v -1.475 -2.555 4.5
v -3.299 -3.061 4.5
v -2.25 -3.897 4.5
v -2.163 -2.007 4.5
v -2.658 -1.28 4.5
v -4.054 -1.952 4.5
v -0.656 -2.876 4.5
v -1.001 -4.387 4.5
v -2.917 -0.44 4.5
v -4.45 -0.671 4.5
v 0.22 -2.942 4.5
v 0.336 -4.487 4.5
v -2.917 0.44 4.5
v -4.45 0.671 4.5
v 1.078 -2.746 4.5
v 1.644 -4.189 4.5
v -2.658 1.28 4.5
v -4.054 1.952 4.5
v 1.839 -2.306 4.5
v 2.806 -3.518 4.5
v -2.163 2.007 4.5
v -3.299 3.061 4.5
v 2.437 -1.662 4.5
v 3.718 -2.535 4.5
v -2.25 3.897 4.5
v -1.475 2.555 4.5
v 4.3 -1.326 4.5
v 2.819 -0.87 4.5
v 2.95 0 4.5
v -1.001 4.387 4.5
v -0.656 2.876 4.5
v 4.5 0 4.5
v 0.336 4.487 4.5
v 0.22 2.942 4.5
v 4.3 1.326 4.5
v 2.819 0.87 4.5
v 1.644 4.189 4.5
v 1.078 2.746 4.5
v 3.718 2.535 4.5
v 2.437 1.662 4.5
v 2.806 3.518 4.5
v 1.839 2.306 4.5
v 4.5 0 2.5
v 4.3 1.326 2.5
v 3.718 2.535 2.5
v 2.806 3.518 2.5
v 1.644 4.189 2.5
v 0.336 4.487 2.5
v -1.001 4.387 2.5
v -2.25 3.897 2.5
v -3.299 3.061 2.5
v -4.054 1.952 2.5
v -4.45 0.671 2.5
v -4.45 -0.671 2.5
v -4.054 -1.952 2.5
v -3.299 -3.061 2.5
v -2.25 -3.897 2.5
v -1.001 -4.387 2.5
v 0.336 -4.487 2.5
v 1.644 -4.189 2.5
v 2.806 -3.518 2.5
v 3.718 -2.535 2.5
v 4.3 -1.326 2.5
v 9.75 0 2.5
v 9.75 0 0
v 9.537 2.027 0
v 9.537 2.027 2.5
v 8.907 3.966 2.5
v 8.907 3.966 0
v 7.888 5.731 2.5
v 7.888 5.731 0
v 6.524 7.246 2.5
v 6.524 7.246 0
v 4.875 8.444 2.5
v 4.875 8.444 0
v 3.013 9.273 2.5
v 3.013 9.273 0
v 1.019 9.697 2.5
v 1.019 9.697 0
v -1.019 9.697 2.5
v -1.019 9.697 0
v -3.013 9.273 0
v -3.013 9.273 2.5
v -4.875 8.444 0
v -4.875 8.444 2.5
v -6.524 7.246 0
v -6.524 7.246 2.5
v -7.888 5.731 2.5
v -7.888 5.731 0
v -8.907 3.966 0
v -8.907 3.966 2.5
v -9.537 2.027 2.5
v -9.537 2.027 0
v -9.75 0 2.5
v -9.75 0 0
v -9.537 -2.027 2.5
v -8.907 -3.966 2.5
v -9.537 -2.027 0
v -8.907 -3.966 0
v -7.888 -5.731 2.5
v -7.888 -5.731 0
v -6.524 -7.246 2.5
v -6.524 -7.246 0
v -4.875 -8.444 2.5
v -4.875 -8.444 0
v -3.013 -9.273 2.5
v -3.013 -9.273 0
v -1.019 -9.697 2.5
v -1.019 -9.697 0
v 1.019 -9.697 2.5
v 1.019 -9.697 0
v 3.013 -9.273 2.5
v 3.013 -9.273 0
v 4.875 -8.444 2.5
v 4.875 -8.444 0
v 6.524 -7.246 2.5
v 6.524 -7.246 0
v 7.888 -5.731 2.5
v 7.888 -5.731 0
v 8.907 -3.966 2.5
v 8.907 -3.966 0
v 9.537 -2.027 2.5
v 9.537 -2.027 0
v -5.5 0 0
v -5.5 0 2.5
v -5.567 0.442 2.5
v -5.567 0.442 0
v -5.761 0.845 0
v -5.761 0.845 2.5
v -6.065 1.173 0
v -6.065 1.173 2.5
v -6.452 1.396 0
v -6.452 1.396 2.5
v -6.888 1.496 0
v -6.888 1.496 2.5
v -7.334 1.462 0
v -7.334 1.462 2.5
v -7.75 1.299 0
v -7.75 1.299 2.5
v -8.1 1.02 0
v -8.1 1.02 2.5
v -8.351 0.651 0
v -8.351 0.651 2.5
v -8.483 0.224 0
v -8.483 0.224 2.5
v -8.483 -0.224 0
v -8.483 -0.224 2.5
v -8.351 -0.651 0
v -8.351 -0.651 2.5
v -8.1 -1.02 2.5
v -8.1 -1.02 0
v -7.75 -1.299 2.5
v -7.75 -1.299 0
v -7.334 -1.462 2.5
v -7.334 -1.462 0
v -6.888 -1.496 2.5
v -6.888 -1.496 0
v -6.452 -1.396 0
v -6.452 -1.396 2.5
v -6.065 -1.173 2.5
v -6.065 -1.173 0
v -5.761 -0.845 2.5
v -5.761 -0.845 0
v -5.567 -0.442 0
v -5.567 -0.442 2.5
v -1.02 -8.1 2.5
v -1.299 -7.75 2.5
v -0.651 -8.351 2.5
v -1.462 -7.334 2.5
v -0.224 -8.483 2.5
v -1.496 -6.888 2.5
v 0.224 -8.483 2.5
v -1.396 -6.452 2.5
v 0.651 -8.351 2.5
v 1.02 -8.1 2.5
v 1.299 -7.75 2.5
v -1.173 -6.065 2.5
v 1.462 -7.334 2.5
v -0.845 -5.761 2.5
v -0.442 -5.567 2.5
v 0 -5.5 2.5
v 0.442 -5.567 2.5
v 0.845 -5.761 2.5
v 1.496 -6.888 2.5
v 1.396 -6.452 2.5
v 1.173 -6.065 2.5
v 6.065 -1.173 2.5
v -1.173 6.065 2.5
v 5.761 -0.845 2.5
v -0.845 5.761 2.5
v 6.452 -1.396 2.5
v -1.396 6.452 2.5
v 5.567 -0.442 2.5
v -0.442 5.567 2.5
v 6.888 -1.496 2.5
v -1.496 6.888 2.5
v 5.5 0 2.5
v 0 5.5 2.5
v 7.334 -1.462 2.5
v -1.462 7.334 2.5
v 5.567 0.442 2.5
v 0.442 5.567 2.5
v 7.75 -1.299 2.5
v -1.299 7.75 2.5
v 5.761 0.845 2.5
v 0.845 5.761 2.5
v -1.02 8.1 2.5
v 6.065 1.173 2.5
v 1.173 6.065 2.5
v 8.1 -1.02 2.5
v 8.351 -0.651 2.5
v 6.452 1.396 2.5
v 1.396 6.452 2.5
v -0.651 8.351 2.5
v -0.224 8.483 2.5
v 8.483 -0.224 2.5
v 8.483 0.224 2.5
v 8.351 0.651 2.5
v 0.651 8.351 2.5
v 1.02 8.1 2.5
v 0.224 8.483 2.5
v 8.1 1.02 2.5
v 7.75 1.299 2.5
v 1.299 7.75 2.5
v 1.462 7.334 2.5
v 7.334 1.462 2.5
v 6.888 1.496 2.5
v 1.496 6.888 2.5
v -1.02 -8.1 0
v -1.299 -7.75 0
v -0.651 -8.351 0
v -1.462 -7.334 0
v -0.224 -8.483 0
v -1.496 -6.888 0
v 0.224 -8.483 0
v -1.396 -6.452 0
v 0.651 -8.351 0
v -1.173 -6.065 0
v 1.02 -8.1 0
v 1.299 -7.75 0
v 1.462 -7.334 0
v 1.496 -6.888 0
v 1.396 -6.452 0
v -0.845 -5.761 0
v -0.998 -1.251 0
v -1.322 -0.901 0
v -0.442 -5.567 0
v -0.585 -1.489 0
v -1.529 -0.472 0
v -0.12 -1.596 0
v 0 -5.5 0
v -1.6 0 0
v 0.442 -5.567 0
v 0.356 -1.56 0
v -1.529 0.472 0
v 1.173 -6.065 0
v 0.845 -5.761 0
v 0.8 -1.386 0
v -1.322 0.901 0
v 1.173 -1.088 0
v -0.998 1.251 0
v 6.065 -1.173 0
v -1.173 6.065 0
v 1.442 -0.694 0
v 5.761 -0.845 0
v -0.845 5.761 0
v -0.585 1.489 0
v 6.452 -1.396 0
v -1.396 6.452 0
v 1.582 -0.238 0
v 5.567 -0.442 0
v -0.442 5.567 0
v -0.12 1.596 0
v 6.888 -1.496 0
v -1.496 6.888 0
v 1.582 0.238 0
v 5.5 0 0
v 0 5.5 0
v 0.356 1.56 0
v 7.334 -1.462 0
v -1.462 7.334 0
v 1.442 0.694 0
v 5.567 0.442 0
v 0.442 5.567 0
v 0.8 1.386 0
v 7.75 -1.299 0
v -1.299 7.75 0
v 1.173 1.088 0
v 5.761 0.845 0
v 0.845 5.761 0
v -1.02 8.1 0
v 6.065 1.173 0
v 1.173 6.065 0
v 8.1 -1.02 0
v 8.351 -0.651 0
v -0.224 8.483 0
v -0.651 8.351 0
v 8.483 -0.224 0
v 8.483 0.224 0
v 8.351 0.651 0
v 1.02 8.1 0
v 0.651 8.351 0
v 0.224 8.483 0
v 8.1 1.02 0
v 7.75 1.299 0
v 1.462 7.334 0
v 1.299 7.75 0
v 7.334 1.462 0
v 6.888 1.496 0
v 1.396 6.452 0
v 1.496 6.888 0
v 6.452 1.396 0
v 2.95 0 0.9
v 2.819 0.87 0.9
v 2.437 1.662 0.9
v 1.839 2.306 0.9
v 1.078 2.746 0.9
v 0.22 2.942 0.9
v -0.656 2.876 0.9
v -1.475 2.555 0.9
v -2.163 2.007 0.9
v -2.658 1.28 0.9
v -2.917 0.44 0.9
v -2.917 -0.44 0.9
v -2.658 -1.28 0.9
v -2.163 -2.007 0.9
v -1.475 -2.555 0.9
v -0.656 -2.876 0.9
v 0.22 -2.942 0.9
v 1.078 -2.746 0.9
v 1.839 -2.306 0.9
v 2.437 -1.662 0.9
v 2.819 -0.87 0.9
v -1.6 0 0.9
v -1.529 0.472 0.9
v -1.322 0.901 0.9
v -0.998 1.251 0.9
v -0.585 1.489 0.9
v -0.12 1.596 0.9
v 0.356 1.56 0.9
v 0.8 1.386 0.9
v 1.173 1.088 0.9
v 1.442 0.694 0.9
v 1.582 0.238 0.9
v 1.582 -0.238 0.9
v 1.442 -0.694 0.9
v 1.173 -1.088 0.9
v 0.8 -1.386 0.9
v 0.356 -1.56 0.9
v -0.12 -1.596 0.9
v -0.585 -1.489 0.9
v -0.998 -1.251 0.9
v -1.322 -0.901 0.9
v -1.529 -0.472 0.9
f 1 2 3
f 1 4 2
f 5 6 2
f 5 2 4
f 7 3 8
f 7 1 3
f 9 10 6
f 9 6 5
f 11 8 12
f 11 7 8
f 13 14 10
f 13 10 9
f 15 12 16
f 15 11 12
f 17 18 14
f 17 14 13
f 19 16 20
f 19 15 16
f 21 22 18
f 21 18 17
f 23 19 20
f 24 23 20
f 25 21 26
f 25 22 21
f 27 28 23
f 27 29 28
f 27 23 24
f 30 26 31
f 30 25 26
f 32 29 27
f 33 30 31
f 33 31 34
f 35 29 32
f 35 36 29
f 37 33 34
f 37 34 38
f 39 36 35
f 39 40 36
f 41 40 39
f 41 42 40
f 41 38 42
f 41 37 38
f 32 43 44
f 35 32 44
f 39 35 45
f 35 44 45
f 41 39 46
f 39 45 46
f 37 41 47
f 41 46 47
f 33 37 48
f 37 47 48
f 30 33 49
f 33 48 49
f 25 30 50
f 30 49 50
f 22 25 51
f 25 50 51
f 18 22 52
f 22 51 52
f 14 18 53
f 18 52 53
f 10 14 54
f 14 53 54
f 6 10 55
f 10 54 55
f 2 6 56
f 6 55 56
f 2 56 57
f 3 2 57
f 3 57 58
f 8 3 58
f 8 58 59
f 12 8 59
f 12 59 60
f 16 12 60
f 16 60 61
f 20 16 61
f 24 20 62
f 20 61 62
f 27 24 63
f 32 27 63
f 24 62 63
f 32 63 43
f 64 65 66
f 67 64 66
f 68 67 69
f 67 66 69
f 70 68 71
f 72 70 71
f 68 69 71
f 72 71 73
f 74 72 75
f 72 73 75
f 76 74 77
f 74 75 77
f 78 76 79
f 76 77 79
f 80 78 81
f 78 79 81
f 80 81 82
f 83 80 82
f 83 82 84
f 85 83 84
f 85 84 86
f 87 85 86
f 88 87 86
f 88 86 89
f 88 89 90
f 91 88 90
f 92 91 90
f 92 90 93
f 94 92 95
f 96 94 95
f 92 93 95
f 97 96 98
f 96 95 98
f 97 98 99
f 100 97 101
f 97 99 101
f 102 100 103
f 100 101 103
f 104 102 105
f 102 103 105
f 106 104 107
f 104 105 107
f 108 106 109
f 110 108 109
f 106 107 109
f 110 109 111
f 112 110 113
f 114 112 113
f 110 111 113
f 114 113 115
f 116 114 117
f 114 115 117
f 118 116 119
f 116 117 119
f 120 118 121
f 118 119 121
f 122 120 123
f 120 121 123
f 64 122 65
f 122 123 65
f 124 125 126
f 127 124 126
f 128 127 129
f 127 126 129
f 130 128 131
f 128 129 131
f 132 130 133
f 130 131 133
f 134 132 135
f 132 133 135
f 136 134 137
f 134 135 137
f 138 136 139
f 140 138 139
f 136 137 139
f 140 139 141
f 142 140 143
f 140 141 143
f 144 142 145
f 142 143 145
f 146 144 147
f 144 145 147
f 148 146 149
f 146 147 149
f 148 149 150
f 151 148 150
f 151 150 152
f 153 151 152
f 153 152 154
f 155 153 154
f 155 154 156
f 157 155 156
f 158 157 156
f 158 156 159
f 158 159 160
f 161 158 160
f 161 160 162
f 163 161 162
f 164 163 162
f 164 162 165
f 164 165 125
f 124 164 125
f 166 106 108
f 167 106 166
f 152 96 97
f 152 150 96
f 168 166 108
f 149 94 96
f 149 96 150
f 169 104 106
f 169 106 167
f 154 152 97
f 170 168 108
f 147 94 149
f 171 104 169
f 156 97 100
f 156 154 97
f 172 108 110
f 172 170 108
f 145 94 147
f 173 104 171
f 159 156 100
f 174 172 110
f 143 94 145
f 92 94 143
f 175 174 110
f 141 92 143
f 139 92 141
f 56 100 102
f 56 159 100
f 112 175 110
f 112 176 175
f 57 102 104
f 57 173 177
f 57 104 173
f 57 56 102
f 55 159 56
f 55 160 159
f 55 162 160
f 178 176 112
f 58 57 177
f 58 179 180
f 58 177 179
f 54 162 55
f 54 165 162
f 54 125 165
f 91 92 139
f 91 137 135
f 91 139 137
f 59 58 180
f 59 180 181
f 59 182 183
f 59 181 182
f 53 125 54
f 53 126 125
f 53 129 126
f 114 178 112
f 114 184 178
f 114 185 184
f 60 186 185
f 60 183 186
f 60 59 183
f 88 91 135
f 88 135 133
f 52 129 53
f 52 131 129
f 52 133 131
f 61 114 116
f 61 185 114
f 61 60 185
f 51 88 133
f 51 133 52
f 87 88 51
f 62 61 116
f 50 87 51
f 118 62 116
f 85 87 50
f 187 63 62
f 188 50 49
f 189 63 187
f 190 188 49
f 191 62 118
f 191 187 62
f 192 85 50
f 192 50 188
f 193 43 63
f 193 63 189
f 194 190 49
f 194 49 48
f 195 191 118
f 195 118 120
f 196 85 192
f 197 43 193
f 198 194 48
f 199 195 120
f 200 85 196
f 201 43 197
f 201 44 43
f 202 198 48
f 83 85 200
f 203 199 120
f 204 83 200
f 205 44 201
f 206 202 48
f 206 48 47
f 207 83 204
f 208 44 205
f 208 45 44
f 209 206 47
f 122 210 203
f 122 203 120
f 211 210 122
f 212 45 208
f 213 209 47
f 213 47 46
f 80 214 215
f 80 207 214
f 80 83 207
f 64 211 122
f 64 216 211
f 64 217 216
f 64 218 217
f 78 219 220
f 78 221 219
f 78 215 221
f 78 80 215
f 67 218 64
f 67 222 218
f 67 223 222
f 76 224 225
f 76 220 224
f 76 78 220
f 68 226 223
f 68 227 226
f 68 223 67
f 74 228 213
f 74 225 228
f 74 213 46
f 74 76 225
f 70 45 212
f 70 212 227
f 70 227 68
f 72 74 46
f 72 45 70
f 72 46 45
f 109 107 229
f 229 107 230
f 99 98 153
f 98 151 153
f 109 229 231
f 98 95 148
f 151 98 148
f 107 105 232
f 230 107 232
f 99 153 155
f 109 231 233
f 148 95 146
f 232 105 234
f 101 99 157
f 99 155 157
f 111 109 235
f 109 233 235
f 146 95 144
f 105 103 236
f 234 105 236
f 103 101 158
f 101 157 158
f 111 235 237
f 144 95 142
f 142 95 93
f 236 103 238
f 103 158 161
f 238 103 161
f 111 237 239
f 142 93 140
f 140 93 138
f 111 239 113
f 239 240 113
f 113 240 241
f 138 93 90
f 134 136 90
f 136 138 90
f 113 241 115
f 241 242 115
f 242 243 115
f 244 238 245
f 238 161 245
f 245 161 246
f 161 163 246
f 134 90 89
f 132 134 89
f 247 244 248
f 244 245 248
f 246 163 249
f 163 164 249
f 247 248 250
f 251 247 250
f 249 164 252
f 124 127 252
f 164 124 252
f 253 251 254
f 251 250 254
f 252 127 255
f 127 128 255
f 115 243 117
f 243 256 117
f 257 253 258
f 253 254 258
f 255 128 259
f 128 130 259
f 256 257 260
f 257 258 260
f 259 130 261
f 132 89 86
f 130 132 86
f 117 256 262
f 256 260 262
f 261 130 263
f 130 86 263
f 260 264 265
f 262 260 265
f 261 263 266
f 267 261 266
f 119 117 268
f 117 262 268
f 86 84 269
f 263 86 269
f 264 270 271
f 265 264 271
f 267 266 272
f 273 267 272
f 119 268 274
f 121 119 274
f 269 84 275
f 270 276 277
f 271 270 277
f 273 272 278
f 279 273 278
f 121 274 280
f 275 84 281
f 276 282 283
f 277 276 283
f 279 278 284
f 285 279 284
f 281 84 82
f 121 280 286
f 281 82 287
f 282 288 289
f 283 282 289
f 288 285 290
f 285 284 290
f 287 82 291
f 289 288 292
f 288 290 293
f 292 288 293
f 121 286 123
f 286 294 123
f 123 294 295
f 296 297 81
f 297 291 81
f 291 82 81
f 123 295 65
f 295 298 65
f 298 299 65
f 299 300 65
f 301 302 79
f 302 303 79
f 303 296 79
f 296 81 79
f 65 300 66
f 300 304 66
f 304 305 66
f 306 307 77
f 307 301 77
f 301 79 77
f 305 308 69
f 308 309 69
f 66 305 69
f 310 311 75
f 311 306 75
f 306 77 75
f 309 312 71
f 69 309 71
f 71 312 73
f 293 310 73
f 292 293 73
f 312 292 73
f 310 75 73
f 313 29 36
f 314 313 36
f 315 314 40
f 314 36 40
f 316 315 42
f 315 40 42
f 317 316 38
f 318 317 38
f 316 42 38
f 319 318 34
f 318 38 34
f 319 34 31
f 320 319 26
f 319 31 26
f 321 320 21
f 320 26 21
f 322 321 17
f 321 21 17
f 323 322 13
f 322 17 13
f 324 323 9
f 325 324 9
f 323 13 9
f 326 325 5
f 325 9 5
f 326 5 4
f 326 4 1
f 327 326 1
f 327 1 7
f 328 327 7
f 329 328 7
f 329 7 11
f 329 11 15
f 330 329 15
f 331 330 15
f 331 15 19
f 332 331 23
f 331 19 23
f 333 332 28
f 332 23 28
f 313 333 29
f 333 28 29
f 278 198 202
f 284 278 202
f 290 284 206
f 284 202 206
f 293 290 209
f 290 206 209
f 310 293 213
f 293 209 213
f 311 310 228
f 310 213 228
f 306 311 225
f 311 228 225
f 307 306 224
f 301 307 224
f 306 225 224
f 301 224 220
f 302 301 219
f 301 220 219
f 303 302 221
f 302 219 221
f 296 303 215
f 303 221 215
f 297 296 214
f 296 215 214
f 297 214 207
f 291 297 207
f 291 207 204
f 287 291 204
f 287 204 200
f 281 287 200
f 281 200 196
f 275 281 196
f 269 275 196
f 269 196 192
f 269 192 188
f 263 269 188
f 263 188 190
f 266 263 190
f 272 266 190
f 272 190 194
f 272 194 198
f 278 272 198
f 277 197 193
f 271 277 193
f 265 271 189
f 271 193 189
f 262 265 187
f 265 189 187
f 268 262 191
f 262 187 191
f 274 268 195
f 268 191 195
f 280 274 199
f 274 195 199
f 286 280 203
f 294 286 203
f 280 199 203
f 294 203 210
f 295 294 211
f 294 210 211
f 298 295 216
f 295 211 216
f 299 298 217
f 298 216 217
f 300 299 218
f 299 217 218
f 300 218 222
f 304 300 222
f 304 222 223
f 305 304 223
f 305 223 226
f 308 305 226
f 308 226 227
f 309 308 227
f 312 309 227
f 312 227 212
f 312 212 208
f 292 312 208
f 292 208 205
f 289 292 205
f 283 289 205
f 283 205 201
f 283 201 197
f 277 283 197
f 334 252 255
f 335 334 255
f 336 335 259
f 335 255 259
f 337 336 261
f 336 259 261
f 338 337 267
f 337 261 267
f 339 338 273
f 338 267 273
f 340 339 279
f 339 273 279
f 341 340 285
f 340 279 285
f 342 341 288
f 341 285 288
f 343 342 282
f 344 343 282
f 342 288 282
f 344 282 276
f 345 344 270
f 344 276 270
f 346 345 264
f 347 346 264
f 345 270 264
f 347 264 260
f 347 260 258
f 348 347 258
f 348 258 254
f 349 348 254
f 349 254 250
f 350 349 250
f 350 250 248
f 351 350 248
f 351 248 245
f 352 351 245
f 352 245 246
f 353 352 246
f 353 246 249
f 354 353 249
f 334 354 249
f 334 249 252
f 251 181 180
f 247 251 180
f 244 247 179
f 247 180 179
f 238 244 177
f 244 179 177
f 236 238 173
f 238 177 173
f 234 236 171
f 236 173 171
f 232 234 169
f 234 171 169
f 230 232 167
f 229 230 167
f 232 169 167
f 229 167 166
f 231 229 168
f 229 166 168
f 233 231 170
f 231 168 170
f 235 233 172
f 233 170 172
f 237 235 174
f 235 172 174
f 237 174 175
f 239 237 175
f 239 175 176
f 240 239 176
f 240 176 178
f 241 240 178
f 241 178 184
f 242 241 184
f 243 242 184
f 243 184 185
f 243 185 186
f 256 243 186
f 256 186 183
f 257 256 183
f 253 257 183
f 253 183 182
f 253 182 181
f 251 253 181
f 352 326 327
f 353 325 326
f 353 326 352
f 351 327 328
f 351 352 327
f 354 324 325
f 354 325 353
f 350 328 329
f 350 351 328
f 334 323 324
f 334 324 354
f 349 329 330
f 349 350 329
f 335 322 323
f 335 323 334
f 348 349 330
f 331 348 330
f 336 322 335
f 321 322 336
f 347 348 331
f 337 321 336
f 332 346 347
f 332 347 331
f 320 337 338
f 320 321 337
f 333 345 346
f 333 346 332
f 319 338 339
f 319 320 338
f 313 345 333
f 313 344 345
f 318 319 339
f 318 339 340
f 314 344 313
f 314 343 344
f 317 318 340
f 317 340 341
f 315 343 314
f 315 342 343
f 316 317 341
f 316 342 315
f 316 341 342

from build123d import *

# Parameters (mm, degrees)
SKETCH_1_R               = 9.75
EXTRUDE_1_DEPTH          = 2.5
SKETCH_2_R               = 4.5
EXTRUDE_2_DEPTH          = 2
SKETCH_3_R               = 2.95
CUT_EXTRUDE_1_DEPTH      = 3.6
SKETCH_4_R               = 1.6
CUT_EXTRUDE_2_DEPTH      = 3.6
SKETCH_5_R               = 1.5
CUT_EXTRUDE_3_DEPTH      = 15.013386457
PATTERN_CIRCULAR_1_COUNT = 4


with BuildPart() as part:
    # 草图1 → 凸台-拉伸1 (new body)
    with BuildSketch(Plane.XY):
        Circle(SKETCH_1_R)
    extrude(amount=EXTRUDE_1_DEPTH)

    # 草图2 → 凸台-拉伸2 (add)
    with BuildSketch(Plane.XY.offset(2.5)):
        Circle(SKETCH_2_R)
    extrude(amount=EXTRUDE_2_DEPTH)

    # 草图3 → 切除-拉伸1 (cut)
    with BuildSketch(Plane.XY.offset(4.5)):
        Circle(SKETCH_3_R)
    extrude(amount=-CUT_EXTRUDE_1_DEPTH, mode=Mode.SUBTRACT)

    # 草图4 → 切除-拉伸2 (cut)
    with BuildSketch(Plane(origin=(0, 0, 0), x_dir=(-1, 0, 0), z_dir=(0, 0, -1))):
        Circle(SKETCH_4_R)
    extrude(amount=-CUT_EXTRUDE_2_DEPTH, mode=Mode.SUBTRACT)

    # 草图5 → 切除-拉伸3 (cut, through all)
    with BuildSketch(Plane.XY.offset(2.5)):
        with Locations((-7, 0)):
            Circle(SKETCH_5_R)
    cut_extrude_3 = extrude(amount=-CUT_EXTRUDE_3_DEPTH, mode=Mode.SUBTRACT)

    # 阵列(圆周)1: 切除-拉伸3 ×4 about axis
    pattern_circular_1_axis = Axis((0, 0, 0), (0, 0, 1))
    for i in range(1, PATTERN_CIRCULAR_1_COUNT):
        add(cut_extrude_3.rotate(pattern_circular_1_axis, i * 360 / PATTERN_CIRCULAR_1_COUNT), mode=Mode.SUBTRACT)


solid = part.part
